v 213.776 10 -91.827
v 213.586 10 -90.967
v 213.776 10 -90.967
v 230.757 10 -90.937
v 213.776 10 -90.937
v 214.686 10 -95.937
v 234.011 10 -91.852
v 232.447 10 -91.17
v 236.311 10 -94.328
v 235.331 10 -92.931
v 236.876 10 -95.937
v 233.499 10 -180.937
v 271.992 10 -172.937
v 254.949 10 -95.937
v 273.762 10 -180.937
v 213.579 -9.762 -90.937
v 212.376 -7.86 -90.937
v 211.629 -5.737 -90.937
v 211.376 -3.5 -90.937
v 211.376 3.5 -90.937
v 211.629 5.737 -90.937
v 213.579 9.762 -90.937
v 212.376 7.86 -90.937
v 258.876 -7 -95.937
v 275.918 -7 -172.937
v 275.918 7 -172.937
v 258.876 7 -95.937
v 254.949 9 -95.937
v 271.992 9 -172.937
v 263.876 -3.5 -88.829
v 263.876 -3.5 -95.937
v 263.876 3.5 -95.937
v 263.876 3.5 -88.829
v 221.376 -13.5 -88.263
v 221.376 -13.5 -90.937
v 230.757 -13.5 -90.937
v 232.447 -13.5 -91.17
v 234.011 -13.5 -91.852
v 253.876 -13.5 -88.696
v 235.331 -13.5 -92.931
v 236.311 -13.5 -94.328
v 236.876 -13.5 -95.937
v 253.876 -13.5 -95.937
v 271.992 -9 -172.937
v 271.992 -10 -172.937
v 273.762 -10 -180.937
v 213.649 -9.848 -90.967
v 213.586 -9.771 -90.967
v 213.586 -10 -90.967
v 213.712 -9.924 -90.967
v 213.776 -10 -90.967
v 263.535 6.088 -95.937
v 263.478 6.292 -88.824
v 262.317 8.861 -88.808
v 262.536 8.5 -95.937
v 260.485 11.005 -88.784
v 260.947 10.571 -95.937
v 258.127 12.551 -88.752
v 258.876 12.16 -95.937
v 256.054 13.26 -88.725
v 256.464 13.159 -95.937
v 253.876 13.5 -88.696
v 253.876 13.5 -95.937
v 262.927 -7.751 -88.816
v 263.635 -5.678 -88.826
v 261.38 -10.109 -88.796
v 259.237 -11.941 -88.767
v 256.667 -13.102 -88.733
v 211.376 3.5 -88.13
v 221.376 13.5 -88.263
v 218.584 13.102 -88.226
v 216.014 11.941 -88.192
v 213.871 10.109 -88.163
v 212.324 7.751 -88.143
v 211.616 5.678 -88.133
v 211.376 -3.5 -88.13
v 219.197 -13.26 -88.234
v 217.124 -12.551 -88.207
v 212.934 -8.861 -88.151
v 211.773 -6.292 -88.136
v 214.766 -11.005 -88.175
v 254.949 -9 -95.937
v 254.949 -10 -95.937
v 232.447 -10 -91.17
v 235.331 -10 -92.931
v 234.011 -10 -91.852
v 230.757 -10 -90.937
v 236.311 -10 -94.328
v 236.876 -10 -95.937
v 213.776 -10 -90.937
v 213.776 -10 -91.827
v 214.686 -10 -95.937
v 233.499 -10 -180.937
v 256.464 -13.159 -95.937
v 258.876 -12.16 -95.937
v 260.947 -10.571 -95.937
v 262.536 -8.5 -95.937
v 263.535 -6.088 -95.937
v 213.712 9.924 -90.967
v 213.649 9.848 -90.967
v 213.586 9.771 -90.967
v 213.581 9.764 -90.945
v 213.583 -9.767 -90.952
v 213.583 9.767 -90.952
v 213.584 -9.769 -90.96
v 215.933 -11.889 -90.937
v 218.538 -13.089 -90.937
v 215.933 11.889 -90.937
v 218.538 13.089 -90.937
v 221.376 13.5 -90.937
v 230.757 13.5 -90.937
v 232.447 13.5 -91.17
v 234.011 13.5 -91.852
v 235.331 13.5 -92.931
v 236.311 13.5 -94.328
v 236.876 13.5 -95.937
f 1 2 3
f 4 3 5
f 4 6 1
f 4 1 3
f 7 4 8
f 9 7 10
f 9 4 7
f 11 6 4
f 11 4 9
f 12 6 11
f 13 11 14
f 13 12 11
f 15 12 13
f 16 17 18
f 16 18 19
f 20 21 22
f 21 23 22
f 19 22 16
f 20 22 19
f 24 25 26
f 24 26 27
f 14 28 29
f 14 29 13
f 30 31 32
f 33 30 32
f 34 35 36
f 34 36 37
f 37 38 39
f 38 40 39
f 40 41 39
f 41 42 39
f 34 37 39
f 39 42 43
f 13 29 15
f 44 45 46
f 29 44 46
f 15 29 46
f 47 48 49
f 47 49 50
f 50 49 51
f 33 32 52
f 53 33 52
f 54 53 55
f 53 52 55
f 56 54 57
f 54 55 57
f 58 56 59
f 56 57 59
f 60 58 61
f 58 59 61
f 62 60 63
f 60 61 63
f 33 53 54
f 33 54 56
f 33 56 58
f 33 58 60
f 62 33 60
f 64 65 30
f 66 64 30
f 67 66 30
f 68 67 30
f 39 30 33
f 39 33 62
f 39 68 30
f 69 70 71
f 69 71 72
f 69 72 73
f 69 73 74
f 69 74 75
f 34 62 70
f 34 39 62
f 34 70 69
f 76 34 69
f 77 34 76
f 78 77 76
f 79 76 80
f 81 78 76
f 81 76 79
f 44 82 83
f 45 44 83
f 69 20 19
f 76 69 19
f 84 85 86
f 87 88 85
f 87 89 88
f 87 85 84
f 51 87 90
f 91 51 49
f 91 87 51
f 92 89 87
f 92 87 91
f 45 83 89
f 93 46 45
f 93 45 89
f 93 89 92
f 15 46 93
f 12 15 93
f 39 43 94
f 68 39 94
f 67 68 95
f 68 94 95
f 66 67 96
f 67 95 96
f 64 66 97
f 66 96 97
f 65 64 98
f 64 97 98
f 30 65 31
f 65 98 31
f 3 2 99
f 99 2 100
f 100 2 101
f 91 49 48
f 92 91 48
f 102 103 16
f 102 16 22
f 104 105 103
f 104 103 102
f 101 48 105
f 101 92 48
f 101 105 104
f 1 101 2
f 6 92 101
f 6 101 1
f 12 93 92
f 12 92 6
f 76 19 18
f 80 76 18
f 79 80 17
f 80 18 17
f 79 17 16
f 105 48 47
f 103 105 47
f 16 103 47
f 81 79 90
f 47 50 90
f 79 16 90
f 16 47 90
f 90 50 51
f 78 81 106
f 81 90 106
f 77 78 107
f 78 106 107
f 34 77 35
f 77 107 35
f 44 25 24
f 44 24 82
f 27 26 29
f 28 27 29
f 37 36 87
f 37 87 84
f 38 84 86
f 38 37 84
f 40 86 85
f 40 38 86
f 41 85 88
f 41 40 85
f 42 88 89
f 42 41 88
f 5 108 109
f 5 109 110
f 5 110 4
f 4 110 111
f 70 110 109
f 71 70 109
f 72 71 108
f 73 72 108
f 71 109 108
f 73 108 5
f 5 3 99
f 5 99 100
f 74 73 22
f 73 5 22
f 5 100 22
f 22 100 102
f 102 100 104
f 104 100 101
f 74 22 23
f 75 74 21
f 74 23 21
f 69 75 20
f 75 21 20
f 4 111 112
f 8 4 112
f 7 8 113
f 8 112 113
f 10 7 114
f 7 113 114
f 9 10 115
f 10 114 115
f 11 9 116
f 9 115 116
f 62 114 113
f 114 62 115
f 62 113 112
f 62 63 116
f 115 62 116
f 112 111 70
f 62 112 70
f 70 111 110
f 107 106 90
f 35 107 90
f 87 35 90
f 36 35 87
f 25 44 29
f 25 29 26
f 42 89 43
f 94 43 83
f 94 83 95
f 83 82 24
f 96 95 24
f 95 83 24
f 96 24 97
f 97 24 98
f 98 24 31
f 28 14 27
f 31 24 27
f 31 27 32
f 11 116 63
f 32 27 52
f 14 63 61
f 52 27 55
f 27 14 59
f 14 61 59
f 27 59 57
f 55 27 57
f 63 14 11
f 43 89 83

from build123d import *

# Parameters (mm, degrees)
EXTRUDE_1_DEPTH          = 10
EXTRUDE_1_DEPTH_BACK     = 10
EXTRUDE_2_DEPTH          = 10
EXTRUDE_2_DEPTH_BACK     = 10
CUT_EXTRUDE_1_DEPTH      = 78.86350451
CUT_EXTRUDE_2_DEPTH      = 331.104586341
CUT_EXTRUDE_2_DEPTH_BACK = 331.104586341
SKETCH_7_W               = 31.119179355
SKETCH_7_H               = 7.69001946
EXTRUDE_3_DEPTH          = 15
CUT_EXTRUDE_3_DEPTH      = 331.22914457
CUT_EXTRUDE_3_DEPTH_BACK = 331.22914457
CUT_EXTRUDE_4_DEPTH      = 3.5
CUT_EXTRUDE_5_DEPTH      = 5.121010883


with BuildPart() as part:
    # 草图3 → 凸台-拉伸1 (new, two sides: drawn at the far end of the back side and taken through both)
    with BuildSketch(Plane(origin=(0, 0, 0), x_dir=(1, 0, 0), z_dir=(0, 1, 0)).offset(-EXTRUDE_1_DEPTH_BACK)):
        Polygon((213.340896476, 89.860350871), (216.879610096, 89.860350871), (218.224577979, 95.937014496), (254.949012169, 95.937014496), (273.762340852, 180.937014496), (233.499193043, 180.937014496), align=None)
    extrude(amount=EXTRUDE_1_DEPTH + EXTRUDE_1_DEPTH_BACK)

    # 草图5 → 凸台-拉伸2 (add, two sides: drawn at the far end of the back side and taken through both)
    with BuildSketch(Plane(origin=(0, 0, 0), x_dir=(1, 0, 0), z_dir=(0, 1, 0)).offset(-EXTRUDE_2_DEPTH_BACK)):
        Polygon((271.991674623, 172.937014496), (275.918166689, 172.937014496), (258.875504234, 95.937014496), (254.949012169, 95.937014496), align=None)
    extrude(amount=EXTRUDE_2_DEPTH + EXTRUDE_2_DEPTH_BACK)

    # 草图6 → 切除-拉伸1 (cut, along a direction that is not the sketch's normal)
    with BuildSketch(Plane(origin=(0, 0, -172.937014496), x_dir=(-1, 0, 0), z_dir=(0, 0, -1))):
        Polygon((-275.918166689, 7), (-271.991674623, 9), (-271.991674623, 10), (-275.918166689, 10), align=None)
        Polygon((-271.991674623, -9), (-271.991674623, -10), (-275.918166689, -10), (-275.918166689, -7), align=None)
    extrude(amount=-CUT_EXTRUDE_1_DEPTH, dir=(0.21610328580589588, 0, -0.9763705084976171), mode=Mode.SUBTRACT)

    # 草图7 → 切除-拉伸2 (cut, two sides: drawn at the far end of the back side and taken through both)
    with BuildSketch(Plane(origin=(0, 0, 0), x_dir=(1, 0, 0), z_dir=(0, 1, 0)).offset(-CUT_EXTRUDE_2_DEPTH_BACK)):
        with Locations((213.489275448, 87.122004766)):
            Rectangle(SKETCH_7_W, SKETCH_7_H)
    extrude(amount=CUT_EXTRUDE_2_DEPTH + CUT_EXTRUDE_2_DEPTH_BACK, mode=Mode.SUBTRACT)

    # 草图8 → 凸台-拉伸3 (add)
    with BuildSketch(Plane.XY.offset(-95.937014496)):
        with BuildLine():
            Line((253.875504234, 13.5), (221.375504234, 13.5))
            ThreePointArc((221.375504234, 13.5), (214.304436422, 10.571067812), (211.375504234, 3.5))
            Line((211.375504234, 3.5), (211.375504234, -3.5))
            ThreePointArc((211.375504234, -3.5), (214.304436422, -10.571067812), (221.375504234, -13.5))
            Line((221.375504234, -13.5), (253.875504234, -13.5))
            ThreePointArc((253.875504234, -13.5), (260.946572046, -10.571067812), (263.875504234, -3.5))
            Line((263.875504234, -3.5), (263.875504234, 3.5))
            ThreePointArc((263.875504234, 3.5), (260.946572046, 10.571067812), (253.875504234, 13.5))
        make_face()
    extrude(amount=EXTRUDE_3_DEPTH)

    # 草图11 → 切除-拉伸3 (cut, two sides: drawn at the far end of the back side and taken through both)
    with BuildSketch(Plane(origin=(0, 0, 0), x_dir=(1, 0, 0), z_dir=(0, 1, 0)).offset(-CUT_EXTRUDE_3_DEPTH_BACK)):
        Polygon((268.062661222, 88.884668272), (201.658116102, 88.000919674), (201.658116102, 68.770636621), (268.062661222, 68.770636621), align=None)
    extrude(amount=CUT_EXTRUDE_3_DEPTH + CUT_EXTRUDE_3_DEPTH_BACK, mode=Mode.SUBTRACT)

    # 草图13 → 切除-拉伸4 (cut)
    with BuildSketch(Plane(origin=(0, 13.5, 0), x_dir=(1, 0, 0), z_dir=(0, 1, 0))):
        with BuildLine():
            Line((208, 90.937014496), (230.757405295, 90.937014496))
            ThreePointArc((230.757405295, 90.937014496), (234.708074056, 92.346011488), (236.875504234, 95.937014496))
            Line((236.875504234, 95.937014496), (236.875504234, 103.30474676))
            Line((236.875504234, 103.30474676), (208, 103.30474676))
            Line((208, 103.30474676), (208, 90.937014496))
        make_face()
    cut_extrude_4 = extrude(amount=-CUT_EXTRUDE_4_DEPTH, mode=Mode.SUBTRACT)

    # 镜向1: 切除-拉伸4 across plane
    add(cut_extrude_4.mirror(Plane.ZX), mode=Mode.SUBTRACT)

    # 草图14 → 切除-拉伸5 (cut, along a direction that is not the sketch's normal)
    with BuildSketch(Plane(origin=(0, 0, -95.937014496), x_dir=(-1, 0, 0), z_dir=(0, 0, -1))):
        with BuildLine():
            Line((-213.776162157, -10), (-214.68586436, -10))
            Line((-214.68586436, -10), (-214.68586436, 10))
            Line((-214.68586436, 10), (-213.776162157, 10))
            ThreePointArc((-213.776162157, 10), (-211.994848053, 6.964576398), (-211.375504234, 3.5))
            Line((-211.375504234, 3.5), (-211.375504234, -3.5))
            ThreePointArc((-211.375504234, -3.5), (-211.994848053, -6.964576398), (-213.776162157, -10))
        make_face()
    extrude(amount=-CUT_EXTRUDE_5_DEPTH, dir=(0.2161032858058959, 0, -0.9763705084976171), mode=Mode.SUBTRACT)


solid = part.part
